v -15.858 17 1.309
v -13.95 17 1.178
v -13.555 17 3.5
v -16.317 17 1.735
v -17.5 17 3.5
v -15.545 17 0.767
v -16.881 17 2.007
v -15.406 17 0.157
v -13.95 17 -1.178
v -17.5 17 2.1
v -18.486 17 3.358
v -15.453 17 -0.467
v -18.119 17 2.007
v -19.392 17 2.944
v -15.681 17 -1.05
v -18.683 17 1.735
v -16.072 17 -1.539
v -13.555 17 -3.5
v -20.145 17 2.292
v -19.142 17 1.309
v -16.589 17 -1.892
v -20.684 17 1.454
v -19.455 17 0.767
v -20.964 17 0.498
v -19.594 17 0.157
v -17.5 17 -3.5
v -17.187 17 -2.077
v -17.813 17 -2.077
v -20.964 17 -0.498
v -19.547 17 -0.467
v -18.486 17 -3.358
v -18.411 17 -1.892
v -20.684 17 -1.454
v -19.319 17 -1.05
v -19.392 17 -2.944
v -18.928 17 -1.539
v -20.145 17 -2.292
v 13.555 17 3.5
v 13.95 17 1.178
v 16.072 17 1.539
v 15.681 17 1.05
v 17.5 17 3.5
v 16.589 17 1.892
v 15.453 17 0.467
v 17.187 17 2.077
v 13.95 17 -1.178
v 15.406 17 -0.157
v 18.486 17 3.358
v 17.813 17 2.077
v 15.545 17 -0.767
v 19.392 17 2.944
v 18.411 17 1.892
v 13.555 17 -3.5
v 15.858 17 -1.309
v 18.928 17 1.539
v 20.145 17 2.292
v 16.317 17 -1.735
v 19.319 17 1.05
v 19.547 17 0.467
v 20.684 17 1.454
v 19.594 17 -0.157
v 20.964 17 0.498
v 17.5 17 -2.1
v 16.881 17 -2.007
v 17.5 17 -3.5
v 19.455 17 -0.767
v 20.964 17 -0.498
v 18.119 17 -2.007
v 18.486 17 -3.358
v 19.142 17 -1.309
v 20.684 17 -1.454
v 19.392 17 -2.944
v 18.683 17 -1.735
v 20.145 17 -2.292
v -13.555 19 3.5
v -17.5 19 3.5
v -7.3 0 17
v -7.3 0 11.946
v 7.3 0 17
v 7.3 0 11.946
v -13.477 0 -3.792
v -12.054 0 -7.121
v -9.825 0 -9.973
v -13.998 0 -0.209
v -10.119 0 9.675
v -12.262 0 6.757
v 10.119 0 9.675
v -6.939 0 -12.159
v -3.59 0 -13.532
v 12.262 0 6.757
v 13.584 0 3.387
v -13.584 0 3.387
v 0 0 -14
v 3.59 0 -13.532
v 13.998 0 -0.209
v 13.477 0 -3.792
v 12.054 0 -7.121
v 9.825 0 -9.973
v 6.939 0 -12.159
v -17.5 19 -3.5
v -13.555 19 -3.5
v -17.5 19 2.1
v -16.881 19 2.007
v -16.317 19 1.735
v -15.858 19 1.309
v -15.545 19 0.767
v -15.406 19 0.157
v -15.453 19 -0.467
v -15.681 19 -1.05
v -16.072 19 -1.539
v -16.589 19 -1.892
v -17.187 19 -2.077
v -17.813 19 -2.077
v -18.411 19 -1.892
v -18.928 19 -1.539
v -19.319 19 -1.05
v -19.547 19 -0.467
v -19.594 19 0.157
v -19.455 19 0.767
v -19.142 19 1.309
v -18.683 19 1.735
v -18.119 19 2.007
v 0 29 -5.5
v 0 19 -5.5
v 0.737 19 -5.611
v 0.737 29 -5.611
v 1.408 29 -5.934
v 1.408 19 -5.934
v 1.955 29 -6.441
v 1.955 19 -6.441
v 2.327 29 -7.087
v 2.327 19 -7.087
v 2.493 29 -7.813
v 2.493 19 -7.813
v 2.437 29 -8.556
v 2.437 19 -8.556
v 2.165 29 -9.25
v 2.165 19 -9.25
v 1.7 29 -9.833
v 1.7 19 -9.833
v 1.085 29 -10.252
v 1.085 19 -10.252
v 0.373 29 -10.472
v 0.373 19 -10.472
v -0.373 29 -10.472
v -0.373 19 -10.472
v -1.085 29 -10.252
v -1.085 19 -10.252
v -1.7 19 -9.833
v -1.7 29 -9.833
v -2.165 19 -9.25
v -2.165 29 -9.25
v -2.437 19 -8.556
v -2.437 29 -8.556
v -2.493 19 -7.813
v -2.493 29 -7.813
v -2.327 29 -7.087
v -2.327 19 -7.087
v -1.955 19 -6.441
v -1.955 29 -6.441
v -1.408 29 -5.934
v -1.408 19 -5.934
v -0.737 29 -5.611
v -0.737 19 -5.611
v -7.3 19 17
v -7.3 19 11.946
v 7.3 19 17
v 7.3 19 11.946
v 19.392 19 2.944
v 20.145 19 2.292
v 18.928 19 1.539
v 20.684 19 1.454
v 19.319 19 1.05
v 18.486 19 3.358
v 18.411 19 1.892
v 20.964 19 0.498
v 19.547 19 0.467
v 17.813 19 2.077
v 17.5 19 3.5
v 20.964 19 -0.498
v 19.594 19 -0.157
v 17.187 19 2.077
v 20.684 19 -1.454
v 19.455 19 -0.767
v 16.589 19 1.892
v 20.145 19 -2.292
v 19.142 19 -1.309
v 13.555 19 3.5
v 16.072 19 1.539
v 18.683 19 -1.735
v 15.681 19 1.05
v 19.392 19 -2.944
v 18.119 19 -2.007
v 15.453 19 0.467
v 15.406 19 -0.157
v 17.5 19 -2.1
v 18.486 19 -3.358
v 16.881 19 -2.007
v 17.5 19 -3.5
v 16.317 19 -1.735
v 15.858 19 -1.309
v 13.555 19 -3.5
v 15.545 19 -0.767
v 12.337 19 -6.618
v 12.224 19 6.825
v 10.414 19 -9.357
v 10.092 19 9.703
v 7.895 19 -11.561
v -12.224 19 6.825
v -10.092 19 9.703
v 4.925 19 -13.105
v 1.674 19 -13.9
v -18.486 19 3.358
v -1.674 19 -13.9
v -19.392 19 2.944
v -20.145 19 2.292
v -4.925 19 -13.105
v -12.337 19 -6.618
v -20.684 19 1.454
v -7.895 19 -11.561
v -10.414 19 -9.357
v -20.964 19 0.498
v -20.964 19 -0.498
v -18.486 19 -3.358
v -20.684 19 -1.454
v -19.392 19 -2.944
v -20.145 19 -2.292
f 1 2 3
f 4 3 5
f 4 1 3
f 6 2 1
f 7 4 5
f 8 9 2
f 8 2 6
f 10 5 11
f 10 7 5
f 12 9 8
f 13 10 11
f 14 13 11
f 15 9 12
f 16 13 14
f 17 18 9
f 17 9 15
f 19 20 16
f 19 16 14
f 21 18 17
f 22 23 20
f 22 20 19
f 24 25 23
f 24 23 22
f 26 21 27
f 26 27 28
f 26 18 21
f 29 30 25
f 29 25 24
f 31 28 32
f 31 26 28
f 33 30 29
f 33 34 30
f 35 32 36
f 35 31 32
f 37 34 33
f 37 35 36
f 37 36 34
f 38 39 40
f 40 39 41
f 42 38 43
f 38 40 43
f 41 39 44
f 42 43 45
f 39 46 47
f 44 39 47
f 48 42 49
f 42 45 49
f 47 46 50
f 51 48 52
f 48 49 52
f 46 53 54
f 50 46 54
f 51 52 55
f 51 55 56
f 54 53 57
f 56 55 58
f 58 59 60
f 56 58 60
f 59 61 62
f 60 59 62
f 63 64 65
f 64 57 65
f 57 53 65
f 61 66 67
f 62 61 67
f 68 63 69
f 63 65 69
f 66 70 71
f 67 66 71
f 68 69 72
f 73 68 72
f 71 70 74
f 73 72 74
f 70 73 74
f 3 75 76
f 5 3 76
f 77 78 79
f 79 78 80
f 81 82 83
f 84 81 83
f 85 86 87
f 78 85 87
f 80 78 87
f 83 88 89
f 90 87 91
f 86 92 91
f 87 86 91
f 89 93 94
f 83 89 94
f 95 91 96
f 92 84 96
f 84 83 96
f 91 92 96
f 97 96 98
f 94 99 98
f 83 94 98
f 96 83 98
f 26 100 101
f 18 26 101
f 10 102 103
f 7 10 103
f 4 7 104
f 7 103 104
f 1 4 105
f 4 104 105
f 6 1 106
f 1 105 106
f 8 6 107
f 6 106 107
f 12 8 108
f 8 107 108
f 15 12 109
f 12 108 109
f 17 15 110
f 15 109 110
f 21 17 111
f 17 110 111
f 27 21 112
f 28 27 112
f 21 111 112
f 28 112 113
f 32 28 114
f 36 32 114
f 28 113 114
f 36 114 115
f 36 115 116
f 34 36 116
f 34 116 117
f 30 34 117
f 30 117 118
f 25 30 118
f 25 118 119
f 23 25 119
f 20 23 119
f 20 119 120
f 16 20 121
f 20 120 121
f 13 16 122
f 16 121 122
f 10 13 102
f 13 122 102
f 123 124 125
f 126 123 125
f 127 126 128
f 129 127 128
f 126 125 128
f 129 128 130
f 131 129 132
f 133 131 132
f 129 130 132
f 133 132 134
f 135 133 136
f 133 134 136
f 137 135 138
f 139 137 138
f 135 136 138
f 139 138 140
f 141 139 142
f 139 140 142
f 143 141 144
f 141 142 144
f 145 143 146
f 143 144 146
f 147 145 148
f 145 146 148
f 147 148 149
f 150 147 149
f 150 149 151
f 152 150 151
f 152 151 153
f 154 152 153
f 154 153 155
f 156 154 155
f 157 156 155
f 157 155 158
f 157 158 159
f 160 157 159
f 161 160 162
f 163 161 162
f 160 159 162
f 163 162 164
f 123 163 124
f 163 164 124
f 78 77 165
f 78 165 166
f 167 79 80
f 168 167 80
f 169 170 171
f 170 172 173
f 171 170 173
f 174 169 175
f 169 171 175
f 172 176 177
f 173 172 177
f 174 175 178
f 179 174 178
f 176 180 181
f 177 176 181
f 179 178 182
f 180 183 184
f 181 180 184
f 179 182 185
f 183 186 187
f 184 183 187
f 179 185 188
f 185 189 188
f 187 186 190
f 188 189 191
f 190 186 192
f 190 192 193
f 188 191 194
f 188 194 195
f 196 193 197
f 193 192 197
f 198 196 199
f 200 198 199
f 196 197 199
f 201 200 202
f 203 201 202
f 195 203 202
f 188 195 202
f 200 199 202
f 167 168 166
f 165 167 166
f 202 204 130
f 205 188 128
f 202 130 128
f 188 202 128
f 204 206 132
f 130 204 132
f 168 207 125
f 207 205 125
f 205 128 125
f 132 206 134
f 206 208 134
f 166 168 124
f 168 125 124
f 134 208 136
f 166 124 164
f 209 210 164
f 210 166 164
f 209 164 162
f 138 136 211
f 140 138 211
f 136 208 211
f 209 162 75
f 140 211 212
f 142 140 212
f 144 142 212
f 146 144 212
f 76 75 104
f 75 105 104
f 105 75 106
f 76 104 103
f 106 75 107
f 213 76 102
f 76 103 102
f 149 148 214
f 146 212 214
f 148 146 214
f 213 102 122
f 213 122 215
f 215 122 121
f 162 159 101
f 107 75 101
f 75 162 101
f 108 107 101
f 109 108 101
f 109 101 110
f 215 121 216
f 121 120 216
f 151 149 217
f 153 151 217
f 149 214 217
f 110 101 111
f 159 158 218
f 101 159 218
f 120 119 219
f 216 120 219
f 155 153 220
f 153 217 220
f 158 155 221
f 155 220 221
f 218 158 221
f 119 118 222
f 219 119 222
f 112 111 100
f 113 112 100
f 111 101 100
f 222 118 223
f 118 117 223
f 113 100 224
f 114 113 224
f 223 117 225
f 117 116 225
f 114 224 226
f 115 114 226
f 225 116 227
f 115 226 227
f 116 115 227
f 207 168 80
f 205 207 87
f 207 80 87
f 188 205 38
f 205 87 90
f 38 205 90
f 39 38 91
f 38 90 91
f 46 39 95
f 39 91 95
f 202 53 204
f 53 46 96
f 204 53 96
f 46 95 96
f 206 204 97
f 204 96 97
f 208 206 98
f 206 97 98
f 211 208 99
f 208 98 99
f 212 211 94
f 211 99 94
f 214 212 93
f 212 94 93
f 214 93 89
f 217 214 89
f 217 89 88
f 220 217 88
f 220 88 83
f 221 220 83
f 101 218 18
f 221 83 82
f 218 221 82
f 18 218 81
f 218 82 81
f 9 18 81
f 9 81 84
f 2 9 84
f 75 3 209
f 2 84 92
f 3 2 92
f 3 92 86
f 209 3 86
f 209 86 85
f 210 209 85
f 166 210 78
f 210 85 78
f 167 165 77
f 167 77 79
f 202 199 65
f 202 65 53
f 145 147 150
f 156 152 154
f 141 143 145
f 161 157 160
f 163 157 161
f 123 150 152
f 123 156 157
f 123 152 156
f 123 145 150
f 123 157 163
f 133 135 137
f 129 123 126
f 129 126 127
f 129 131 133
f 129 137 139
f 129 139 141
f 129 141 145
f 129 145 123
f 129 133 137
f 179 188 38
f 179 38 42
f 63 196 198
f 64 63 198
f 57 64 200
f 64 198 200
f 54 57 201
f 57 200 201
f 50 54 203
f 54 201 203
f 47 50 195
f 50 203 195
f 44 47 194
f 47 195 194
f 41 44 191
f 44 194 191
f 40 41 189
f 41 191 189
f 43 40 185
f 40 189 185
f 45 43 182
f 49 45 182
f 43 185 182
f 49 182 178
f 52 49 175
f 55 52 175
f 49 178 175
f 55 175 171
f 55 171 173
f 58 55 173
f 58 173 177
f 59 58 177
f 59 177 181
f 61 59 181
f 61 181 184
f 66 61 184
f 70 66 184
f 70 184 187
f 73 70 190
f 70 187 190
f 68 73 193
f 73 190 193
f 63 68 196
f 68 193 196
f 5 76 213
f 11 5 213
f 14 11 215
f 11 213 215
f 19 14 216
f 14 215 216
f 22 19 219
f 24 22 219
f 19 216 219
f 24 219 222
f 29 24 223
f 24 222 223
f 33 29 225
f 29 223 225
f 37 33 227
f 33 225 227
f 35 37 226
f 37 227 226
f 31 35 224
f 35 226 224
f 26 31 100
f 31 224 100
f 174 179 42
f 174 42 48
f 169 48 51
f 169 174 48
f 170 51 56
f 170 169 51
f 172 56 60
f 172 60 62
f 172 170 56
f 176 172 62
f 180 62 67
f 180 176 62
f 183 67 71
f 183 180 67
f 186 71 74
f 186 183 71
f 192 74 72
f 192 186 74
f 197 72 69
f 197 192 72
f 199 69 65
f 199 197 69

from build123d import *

# Parameters (mm, degrees)
SKETCH1_R           = 14
BOSS_EXTRUDE1_DEPTH = 19
SKETCH2_W           = 14.6
SKETCH2_H           = 5.495823158
BOSS_EXTRUDE2_DEPTH = 19
SKETCH3_R           = 2.1
BOSS_EXTRUDE3_DEPTH = 2
SKETCH4_R           = 2.5
BOSS_EXTRUDE4_DEPTH = 10


with BuildPart() as part:
    # Sketch1 → Boss-Extrude1 (new body)
    with BuildSketch(Plane(origin=(0, 0, 0), x_dir=(1, 0, 0), z_dir=(0, 1, 0))):
        with Locations(Location((0, 0, 0), (0, 0, 270))):
            Circle(SKETCH1_R)
    extrude(amount=BOSS_EXTRUDE1_DEPTH)

    # Sketch2 → Boss-Extrude2 (add)
    with BuildSketch(Plane(origin=(0, 19, 0), x_dir=(1, 0, 0), z_dir=(0, 1, 0))):
        with Locations((0, -14.252088421)):
            Rectangle(SKETCH2_W, SKETCH2_H)
    extrude(amount=-BOSS_EXTRUDE2_DEPTH)

    # Sketch3 → Boss-Extrude3 (add)
    # profile 1 of 2: a face of its own
    with BuildSketch(Plane(origin=(0, 19, 0), x_dir=(1, 0, 0), z_dir=(0, 1, 0))):
        with BuildLine():
            Line((-17.5, 3.5), (-12.399863738, 3.5))
            Line((-12.399863738, 3.5), (-12.399863738, -3.5))
            Line((-12.399863738, -3.5), (-17.5, -3.5))
            ThreePointArc((-17.5, -3.5), (-21, 0), (-17.5, 3.5))
        make_face()
        with Locations(Location((-17.5, 0, 0), (0, 0, 270))):
            Circle(SKETCH3_R, mode=Mode.SUBTRACT)
    # profile 2 of 2: a face of its own
    with BuildSketch(Plane(origin=(0, 19, 0), x_dir=(1, 0, 0), z_dir=(0, 1, 0))):
        with BuildLine():
            Line((12.399863738, -3.5), (17.5, -3.5))
            ThreePointArc((17.5, -3.5), (21, 0), (17.5, 3.5))
            Line((17.5, 3.5), (12.399863738, 3.5))
            Line((12.399863738, 3.5), (12.399863738, -3.5))
        make_face()
        with Locations(Location((17.5, 0, 0), (0, 0, 90))):
            Circle(SKETCH3_R, mode=Mode.SUBTRACT)
    extrude(amount=-BOSS_EXTRUDE3_DEPTH)

    # Sketch4 → Boss-Extrude4 (add)
    with BuildSketch(Plane(origin=(0, 19, 0), x_dir=(1, 0, 0), z_dir=(0, 1, 0))):
        with Locations(Location((0, 8, 0), (0, 0, 270))):
            Circle(SKETCH4_R)
    extrude(amount=BOSS_EXTRUDE4_DEPTH)


solid = part.part
